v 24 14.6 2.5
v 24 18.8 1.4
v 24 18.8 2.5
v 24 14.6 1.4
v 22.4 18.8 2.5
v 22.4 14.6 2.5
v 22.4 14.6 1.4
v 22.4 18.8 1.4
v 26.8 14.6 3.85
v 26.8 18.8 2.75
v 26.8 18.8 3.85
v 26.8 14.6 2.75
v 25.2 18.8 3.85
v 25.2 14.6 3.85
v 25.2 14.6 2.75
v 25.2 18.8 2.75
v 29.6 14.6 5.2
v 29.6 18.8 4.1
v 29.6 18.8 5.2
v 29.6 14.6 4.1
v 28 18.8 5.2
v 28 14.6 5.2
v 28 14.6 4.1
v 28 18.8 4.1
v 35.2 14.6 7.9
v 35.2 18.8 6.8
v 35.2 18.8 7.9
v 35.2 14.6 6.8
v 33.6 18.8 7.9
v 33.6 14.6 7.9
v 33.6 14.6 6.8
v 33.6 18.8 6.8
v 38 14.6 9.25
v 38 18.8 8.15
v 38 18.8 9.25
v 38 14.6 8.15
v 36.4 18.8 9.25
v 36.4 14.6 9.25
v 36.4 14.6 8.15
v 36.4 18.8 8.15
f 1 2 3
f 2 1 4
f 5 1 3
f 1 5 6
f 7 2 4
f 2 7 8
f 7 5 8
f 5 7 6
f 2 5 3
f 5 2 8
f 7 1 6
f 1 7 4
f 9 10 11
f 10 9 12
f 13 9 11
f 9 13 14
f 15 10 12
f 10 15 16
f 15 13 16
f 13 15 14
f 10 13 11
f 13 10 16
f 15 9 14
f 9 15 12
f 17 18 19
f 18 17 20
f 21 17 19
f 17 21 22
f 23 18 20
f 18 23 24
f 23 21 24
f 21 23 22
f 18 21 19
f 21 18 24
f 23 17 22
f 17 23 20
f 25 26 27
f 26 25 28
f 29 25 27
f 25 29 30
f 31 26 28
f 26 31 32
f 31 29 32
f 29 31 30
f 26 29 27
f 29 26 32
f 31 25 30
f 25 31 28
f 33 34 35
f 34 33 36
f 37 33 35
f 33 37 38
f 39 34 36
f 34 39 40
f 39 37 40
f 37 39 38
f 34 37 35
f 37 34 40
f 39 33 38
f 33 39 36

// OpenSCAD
union() {
  for (i = [0:5]) {
    if (i != 3) {
      translate([22.4 + i * 2.8, 14.6, 1.4 + i * 1.35]) cube(size=[1.6,4.2,1.1], center=false);
    }
  }
}
